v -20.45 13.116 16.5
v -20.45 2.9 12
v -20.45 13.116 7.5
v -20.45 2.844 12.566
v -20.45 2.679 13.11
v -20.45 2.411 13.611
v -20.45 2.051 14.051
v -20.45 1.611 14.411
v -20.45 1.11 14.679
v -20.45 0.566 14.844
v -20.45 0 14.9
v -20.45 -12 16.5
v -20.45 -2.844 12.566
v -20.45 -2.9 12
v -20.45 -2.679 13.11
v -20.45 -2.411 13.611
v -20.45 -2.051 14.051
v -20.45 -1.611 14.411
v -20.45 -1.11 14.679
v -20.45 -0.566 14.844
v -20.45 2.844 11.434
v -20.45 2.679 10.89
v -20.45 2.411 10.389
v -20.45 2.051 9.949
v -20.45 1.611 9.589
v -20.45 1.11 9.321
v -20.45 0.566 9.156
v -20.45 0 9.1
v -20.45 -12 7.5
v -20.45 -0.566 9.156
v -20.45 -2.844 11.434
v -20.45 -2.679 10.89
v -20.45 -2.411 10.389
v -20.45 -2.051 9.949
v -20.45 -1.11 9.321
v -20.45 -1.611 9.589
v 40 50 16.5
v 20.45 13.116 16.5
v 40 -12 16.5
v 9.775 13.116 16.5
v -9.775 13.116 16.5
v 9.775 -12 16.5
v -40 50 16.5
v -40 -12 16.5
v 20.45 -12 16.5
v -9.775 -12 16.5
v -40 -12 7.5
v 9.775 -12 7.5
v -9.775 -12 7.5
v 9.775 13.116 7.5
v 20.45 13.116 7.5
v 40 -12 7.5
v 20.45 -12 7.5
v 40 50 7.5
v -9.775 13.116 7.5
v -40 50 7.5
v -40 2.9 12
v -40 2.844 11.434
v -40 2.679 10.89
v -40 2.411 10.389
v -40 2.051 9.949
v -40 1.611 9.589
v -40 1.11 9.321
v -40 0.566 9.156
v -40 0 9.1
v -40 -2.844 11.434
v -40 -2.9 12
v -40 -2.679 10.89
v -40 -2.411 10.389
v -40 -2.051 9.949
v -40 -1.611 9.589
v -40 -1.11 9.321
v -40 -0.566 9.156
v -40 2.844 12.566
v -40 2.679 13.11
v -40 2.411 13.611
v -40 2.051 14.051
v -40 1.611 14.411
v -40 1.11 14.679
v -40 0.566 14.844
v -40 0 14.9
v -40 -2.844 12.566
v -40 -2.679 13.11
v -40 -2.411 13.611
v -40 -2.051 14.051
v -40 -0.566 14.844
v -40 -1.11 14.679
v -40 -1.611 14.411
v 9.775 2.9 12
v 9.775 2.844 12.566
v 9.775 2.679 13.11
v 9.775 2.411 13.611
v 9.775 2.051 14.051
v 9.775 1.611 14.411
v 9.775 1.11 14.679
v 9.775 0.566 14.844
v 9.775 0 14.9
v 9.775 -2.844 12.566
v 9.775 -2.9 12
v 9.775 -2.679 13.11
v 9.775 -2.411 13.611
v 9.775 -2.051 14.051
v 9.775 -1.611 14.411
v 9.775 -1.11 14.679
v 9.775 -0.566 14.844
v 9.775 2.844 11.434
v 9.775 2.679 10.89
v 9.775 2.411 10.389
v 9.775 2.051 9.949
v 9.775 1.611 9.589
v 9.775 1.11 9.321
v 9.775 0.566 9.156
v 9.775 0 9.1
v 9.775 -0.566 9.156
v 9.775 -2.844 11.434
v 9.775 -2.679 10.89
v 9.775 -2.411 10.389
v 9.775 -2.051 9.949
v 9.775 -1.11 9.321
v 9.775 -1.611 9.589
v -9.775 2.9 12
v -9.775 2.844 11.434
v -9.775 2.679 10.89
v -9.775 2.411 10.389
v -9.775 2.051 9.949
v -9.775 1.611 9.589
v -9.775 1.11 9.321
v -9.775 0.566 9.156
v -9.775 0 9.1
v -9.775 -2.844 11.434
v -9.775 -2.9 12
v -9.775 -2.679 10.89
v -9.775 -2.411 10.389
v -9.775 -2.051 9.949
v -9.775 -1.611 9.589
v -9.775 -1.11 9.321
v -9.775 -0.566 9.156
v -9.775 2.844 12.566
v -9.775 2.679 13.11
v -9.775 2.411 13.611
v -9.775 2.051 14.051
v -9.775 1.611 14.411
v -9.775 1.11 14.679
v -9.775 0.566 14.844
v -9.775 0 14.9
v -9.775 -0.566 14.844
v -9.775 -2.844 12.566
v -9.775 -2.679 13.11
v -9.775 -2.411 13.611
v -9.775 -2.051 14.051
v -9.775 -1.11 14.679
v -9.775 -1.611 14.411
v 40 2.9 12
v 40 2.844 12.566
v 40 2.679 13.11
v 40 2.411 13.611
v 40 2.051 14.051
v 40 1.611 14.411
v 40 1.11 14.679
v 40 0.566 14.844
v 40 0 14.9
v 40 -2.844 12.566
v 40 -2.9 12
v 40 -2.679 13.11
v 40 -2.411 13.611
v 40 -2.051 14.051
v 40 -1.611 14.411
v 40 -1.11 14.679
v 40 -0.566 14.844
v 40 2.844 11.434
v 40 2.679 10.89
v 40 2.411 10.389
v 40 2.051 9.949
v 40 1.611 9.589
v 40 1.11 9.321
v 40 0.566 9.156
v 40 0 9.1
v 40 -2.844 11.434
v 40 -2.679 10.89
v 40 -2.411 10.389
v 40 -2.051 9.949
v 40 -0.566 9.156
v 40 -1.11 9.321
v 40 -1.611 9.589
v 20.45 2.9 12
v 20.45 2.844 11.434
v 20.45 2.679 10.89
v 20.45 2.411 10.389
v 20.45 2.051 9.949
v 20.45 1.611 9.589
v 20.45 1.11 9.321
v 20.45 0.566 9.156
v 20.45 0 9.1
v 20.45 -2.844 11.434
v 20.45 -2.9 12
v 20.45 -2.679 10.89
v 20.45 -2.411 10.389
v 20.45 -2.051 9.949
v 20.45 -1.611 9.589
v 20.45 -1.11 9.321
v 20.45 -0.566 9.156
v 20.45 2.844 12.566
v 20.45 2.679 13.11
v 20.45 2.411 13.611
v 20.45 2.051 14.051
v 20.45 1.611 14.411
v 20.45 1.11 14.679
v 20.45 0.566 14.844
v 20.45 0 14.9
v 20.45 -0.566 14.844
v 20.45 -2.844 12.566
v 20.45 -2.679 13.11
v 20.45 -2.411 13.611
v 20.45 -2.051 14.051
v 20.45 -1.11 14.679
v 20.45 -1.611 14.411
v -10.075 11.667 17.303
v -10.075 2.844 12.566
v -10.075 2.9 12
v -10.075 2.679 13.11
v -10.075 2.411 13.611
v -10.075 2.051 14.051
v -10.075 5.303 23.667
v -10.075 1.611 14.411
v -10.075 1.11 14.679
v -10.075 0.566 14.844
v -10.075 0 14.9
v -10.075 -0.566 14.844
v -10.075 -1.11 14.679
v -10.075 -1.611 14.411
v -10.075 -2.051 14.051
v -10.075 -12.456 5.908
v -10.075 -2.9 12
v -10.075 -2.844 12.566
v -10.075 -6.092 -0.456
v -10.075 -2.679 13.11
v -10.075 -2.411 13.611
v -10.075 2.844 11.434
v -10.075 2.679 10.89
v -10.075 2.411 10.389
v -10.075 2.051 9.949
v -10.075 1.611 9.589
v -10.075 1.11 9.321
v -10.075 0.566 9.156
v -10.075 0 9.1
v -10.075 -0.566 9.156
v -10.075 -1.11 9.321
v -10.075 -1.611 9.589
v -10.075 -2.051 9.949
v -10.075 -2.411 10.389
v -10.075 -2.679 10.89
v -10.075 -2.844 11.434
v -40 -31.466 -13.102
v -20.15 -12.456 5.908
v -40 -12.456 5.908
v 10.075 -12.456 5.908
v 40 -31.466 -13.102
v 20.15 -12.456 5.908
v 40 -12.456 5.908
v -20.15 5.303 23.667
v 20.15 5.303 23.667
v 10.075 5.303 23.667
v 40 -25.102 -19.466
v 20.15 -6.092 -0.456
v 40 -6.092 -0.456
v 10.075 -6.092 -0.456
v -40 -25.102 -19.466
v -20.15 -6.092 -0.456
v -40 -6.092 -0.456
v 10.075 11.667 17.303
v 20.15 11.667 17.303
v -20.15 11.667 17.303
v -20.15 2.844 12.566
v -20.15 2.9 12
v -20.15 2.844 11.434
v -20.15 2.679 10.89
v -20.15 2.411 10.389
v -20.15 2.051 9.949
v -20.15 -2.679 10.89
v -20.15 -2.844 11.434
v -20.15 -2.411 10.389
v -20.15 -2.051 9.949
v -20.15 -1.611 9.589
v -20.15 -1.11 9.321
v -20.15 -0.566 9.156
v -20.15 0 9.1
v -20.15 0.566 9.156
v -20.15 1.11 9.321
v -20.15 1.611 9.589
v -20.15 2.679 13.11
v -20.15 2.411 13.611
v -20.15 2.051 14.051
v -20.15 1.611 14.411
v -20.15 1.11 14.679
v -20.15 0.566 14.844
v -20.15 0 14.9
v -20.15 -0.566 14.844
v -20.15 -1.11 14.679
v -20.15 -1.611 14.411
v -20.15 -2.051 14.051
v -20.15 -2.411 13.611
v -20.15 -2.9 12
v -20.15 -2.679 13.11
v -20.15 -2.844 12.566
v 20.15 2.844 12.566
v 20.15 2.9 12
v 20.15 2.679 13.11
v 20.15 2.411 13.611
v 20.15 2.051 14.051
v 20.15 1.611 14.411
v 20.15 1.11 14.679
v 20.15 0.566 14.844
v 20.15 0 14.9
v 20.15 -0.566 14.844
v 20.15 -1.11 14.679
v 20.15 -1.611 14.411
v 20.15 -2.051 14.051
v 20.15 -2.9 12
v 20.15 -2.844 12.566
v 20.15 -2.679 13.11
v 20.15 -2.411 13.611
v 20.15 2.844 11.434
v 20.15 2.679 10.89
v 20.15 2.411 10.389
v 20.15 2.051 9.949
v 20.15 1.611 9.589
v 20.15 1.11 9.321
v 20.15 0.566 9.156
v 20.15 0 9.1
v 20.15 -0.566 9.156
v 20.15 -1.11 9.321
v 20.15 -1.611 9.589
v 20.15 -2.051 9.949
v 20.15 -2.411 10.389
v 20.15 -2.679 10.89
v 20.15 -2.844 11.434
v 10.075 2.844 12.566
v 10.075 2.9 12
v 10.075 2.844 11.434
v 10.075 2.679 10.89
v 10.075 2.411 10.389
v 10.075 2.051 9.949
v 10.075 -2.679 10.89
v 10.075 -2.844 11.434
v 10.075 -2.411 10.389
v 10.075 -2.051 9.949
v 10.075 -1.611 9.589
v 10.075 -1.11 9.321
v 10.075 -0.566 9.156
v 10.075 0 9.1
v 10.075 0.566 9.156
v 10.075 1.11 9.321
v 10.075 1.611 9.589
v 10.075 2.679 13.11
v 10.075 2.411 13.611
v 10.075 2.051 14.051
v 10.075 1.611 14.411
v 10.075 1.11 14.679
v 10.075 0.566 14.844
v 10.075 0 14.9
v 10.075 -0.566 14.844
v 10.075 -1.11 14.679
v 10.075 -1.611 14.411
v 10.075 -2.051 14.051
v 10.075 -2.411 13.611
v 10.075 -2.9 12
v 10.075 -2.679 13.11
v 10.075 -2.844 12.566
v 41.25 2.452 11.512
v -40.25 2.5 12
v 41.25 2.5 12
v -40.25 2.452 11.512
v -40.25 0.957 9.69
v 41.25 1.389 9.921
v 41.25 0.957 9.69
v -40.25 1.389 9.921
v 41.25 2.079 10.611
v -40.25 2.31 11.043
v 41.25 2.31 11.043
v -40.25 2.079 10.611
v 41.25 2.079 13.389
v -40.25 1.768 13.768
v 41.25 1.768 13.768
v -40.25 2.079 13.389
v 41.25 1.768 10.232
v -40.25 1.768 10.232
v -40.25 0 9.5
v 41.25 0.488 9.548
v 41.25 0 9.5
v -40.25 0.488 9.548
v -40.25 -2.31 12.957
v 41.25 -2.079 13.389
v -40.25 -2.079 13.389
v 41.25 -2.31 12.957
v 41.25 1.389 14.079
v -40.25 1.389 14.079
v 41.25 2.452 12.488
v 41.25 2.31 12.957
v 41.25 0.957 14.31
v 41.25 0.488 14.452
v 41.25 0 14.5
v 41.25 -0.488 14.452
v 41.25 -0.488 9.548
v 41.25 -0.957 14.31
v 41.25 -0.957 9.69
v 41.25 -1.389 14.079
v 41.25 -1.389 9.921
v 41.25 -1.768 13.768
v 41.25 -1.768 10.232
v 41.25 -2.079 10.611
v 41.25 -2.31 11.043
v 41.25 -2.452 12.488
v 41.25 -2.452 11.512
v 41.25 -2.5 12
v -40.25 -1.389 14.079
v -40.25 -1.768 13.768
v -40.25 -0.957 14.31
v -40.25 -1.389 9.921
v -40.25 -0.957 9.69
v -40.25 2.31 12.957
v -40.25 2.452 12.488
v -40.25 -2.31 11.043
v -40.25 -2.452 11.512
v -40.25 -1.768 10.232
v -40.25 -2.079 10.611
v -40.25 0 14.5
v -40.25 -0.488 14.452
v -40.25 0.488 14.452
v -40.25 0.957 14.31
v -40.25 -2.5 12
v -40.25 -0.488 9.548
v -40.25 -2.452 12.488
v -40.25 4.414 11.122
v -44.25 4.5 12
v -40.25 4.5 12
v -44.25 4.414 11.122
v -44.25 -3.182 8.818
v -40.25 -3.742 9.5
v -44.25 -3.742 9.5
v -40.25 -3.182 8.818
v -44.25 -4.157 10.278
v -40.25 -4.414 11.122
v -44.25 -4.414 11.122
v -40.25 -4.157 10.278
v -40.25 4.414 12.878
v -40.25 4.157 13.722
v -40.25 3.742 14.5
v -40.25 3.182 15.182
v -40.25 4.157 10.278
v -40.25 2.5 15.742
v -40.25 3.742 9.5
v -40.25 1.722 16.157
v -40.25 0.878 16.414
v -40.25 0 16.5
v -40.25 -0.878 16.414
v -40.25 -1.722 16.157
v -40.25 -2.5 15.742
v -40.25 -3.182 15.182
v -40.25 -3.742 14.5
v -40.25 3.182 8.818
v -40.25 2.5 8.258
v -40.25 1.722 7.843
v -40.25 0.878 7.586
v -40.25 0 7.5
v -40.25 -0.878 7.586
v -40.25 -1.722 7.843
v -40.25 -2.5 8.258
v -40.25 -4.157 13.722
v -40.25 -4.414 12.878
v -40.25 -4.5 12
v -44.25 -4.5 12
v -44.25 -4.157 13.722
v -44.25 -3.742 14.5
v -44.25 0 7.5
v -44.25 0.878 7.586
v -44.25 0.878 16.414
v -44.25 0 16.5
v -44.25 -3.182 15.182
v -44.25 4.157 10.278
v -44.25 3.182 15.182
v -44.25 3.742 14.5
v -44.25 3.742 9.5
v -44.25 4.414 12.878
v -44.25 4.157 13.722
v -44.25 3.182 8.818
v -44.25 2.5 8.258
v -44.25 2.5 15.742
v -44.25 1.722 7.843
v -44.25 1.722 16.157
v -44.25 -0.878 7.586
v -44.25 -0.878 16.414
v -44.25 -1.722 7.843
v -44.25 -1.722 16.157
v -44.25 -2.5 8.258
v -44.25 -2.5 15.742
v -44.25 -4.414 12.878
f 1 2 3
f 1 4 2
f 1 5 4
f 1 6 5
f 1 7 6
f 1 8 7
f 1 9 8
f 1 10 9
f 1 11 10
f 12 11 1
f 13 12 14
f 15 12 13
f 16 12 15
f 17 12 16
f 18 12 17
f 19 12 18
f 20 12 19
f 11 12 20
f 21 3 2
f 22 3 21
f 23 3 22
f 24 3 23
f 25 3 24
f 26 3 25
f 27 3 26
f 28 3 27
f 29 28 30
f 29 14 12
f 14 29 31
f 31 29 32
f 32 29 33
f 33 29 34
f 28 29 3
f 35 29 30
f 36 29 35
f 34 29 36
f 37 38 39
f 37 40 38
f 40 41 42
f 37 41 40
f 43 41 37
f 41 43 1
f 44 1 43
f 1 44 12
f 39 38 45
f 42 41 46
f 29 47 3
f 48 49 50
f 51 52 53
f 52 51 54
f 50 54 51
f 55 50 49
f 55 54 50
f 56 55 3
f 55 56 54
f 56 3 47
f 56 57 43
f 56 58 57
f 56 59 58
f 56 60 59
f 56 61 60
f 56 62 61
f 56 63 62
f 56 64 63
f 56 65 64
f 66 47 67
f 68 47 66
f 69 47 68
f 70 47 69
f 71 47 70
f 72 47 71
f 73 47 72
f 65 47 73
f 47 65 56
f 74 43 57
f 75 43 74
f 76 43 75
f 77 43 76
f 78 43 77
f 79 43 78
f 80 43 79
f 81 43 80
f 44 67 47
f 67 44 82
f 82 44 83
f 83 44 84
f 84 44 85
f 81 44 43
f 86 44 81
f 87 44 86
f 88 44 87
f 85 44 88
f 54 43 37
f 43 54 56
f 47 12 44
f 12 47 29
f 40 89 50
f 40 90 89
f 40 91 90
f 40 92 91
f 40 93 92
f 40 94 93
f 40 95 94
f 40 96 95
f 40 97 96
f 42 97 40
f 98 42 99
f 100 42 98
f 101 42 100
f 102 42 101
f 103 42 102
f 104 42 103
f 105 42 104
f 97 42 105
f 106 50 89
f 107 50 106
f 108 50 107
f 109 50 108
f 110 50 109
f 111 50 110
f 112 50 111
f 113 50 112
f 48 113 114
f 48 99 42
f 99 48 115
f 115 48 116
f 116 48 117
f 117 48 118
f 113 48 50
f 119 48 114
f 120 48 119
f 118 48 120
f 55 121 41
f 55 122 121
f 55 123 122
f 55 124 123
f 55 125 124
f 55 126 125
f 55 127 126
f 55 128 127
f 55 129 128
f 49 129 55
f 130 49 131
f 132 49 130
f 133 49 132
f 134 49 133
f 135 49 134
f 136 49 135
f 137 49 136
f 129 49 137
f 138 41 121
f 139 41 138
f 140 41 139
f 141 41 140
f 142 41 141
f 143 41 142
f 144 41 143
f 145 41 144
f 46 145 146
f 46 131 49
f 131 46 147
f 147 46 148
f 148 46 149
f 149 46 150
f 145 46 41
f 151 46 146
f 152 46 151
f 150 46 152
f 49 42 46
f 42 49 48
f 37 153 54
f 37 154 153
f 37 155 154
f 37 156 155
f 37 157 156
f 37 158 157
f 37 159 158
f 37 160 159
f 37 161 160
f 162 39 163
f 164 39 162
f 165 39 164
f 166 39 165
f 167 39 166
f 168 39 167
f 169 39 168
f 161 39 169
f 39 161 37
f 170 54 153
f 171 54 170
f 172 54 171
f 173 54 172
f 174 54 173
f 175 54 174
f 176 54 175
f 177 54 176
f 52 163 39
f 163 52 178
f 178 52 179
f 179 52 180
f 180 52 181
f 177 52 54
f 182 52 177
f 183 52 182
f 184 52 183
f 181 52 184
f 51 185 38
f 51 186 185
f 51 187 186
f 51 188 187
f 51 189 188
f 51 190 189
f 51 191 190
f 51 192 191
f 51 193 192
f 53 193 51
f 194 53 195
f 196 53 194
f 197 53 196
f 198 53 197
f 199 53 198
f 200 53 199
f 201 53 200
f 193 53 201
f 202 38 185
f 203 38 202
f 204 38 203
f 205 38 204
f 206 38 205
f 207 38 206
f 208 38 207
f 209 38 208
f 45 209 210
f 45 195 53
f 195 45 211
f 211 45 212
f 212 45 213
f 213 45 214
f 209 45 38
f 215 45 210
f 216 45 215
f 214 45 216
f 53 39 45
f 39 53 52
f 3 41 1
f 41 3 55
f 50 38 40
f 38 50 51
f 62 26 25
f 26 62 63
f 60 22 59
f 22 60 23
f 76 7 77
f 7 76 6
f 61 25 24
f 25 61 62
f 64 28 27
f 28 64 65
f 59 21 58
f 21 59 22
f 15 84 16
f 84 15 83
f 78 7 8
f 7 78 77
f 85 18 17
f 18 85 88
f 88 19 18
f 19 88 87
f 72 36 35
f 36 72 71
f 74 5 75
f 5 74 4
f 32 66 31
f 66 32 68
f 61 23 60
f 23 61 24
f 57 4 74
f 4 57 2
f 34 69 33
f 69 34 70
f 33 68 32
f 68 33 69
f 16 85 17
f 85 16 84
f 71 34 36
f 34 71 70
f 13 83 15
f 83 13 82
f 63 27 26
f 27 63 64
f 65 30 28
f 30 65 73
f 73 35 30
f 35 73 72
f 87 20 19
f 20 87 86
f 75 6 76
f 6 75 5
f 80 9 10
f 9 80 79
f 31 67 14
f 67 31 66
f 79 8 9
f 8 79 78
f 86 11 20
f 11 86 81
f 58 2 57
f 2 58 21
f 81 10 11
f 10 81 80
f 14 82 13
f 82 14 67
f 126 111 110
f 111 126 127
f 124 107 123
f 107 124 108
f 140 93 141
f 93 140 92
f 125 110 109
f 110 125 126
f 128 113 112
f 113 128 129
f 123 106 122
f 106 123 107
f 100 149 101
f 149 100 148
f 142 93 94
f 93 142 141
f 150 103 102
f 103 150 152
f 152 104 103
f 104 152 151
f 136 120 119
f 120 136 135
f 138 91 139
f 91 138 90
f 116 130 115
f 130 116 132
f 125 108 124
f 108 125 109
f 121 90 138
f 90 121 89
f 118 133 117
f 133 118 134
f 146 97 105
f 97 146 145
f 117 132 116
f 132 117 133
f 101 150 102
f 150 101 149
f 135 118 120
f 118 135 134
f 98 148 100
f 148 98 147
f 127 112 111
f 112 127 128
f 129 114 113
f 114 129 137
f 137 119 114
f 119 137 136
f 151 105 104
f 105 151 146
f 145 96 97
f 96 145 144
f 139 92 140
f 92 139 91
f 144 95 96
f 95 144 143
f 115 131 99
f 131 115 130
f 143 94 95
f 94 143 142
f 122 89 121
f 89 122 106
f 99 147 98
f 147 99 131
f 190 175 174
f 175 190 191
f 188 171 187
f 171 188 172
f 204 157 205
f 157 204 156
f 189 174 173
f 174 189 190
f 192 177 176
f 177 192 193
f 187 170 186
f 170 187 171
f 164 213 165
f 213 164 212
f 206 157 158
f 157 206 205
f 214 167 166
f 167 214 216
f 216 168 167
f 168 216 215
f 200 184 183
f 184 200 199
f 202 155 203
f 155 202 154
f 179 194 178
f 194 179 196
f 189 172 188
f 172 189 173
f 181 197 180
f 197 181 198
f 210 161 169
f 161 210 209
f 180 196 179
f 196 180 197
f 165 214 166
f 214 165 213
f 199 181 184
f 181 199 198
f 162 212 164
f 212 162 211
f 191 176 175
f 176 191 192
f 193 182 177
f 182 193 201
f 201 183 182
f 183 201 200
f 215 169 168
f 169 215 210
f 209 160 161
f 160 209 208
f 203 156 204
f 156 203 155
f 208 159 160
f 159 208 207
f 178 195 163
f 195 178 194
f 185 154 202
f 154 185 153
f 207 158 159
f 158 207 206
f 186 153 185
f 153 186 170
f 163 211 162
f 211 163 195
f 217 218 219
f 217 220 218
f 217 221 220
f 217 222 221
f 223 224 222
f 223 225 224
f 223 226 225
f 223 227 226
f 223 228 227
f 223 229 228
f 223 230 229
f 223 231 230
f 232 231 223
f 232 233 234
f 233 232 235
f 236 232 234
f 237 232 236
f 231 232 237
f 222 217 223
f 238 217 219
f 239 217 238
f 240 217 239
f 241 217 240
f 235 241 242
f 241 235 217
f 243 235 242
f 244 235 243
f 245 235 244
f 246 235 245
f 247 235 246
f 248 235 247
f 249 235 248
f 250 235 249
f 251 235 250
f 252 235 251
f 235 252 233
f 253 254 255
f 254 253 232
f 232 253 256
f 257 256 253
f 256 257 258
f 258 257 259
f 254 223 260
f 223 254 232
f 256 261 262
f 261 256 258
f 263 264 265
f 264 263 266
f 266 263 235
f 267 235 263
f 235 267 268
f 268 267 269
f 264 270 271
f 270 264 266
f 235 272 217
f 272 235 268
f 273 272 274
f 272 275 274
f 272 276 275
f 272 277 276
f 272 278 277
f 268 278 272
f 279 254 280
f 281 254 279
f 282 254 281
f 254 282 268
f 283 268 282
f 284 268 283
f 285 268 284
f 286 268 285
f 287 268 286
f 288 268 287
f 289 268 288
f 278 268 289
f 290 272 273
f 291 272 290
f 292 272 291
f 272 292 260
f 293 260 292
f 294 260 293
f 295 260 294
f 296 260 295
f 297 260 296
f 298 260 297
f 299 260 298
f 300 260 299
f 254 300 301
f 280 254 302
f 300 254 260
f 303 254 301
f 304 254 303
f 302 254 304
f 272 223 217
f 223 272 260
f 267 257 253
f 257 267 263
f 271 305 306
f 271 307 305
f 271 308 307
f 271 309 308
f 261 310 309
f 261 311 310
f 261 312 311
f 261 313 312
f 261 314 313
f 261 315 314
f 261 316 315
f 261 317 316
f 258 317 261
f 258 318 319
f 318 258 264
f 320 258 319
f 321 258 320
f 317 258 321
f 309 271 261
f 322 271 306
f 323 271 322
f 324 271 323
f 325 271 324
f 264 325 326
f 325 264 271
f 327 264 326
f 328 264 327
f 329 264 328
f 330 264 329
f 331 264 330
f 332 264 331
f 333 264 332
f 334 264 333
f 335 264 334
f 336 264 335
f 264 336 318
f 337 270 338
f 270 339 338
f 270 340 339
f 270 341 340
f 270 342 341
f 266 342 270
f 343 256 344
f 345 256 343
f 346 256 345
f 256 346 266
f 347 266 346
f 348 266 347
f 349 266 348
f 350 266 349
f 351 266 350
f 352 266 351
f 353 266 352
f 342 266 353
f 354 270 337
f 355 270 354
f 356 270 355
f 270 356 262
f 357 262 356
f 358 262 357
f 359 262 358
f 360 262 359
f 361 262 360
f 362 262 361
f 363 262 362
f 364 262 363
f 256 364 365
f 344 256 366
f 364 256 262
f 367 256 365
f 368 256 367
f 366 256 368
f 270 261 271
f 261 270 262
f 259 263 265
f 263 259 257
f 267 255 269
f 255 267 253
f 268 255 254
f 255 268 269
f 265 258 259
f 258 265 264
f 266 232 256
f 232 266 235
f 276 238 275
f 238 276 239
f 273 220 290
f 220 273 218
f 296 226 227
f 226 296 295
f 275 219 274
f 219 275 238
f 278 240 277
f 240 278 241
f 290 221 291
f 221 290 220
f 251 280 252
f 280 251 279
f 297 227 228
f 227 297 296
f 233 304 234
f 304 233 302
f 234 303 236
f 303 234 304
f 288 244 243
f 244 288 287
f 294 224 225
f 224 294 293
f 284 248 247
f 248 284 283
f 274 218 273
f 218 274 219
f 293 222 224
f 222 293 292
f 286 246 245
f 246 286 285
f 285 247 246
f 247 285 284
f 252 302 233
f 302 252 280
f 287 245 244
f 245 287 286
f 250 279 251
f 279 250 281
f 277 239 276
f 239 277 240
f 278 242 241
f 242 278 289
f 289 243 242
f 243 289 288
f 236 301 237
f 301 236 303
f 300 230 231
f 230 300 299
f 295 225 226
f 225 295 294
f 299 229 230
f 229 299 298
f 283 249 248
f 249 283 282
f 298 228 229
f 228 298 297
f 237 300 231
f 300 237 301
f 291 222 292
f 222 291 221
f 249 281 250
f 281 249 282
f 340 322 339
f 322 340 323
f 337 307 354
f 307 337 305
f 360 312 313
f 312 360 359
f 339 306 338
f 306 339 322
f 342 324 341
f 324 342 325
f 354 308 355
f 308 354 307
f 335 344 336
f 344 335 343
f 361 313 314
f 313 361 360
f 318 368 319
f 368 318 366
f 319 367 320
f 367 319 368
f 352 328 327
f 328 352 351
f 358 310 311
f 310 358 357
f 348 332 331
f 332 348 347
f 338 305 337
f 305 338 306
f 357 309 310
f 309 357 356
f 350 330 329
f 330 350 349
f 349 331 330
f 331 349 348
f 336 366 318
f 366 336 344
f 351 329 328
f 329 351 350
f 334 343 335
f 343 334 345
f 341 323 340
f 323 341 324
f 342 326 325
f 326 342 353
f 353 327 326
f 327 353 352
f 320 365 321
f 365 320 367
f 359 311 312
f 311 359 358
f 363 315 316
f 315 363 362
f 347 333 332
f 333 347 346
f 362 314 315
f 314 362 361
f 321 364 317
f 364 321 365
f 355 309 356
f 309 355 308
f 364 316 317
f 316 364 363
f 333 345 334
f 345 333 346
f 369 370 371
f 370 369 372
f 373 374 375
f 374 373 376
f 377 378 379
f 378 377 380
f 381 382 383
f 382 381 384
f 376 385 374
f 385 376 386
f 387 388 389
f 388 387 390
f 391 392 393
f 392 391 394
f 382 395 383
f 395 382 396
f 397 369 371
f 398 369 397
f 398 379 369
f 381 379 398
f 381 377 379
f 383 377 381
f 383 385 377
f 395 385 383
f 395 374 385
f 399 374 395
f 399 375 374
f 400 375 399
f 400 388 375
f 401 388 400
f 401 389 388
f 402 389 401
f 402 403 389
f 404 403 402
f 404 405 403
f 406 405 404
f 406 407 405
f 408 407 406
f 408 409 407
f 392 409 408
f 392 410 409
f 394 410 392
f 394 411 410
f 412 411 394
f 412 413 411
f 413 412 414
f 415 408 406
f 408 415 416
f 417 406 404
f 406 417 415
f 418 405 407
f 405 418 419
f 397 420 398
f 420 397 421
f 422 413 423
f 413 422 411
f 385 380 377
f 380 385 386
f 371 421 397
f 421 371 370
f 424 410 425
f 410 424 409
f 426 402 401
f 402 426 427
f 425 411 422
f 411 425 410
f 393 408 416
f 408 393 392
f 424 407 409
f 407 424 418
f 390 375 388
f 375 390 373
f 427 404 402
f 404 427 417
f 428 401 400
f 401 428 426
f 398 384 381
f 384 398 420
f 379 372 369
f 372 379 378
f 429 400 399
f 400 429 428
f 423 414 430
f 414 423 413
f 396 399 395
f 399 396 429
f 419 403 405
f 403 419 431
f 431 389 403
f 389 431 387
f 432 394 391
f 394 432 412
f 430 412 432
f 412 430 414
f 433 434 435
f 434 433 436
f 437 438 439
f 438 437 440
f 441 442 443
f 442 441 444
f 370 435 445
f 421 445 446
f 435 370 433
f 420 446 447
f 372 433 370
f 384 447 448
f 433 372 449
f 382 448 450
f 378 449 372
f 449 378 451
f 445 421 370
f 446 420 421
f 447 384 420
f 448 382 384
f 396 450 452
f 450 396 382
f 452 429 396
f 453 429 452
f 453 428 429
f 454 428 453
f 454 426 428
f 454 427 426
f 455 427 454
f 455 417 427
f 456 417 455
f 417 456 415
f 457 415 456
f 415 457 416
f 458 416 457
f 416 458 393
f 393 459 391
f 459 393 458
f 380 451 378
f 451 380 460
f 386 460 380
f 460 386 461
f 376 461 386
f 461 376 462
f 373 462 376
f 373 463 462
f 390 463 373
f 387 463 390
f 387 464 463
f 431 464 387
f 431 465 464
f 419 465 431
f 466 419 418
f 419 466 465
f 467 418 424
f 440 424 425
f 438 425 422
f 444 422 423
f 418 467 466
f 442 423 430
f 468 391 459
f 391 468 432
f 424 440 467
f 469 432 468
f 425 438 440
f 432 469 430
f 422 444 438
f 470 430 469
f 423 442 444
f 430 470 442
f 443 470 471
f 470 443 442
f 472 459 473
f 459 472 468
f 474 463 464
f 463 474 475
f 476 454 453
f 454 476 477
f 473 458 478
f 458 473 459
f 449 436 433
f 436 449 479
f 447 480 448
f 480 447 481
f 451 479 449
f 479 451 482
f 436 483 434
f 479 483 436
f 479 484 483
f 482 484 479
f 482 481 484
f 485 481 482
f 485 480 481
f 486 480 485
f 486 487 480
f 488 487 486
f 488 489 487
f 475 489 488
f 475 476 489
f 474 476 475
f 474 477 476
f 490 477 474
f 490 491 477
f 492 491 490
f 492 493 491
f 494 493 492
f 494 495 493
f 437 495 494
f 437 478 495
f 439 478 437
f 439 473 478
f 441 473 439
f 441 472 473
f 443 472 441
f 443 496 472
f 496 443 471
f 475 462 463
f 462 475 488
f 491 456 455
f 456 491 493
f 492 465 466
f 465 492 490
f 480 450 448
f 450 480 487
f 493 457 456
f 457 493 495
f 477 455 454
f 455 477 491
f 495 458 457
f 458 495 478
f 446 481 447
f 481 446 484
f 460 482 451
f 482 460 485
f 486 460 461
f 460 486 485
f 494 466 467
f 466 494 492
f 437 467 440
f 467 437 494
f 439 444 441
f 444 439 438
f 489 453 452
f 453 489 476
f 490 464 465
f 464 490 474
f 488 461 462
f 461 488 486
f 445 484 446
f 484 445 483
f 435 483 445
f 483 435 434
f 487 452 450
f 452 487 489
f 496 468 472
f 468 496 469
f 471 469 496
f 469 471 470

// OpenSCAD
$fn = 32;

// ------------------------------------------------------------------------
// Butt hinge: hinge 80 mm, leaf swung 45 deg
// Every part is its own module, assembly() places every instance.
// ------------------------------------------------------------------------

// --- part 1 ---
module hinge_base() {
  difference() {
    union() {
      translate([-40, -12, -4.5]) cube([19.55, 62, 9]);
      translate([-9.775, -12, -4.5]) cube([19.55, 62, 9]);
      translate([20.45, -12, -4.5]) cube([19.55, 62, 9]);
      translate([-40, 13.116, -4.5]) cube([80, 36.884, 9]);
    }
    translate([-30.225, 0, 0]) rotate([0, 90, 0]) cylinder(h = 21.55, d = 5.8, center = true);
    translate([0, 0, 0]) rotate([0, 90, 0]) cylinder(h = 21.55, d = 5.8, center = true);
    translate([30.225, 0, 0]) rotate([0, 90, 0]) cylinder(h = 21.55, d = 5.8, center = true);
  }
}

// --- part 2 ---
module hinge_mover() {
  difference() {
    union() {
      translate([-20.15, -40, -4.5]) cube([10.075, 52, 9]);
      translate([10.075, -40, -4.5]) cube([10.075, 52, 9]);
      translate([-40, -40, -4.5]) cube([80, 26.884, 9]);
    }
    translate([-15.113, 0, 0]) rotate([0, 90, 0]) cylinder(h = 12.075, d = 5.8, center = true);
    translate([15.113, 0, 0]) rotate([0, 90, 0]) cylinder(h = 12.075, d = 5.8, center = true);
  }
}

// --- part 3 ---
module hinge_pin() {
  rotate([0, 90, 0]) cylinder(h = 82.5, d = 5, center = true);
  translate([-44.25, 0, 0]) rotate([0, 90, 0]) cylinder(h = 4, d = 9);
}

// --- assembly ---
module assembly() {
  color([0.80, 0.24, 0.20]) translate([0, 0, 12]) rotate([0, 0, 0]) hinge_base();
  color([0.20, 0.45, 0.75]) translate([0, 0, 12]) rotate([45, 0, 0]) hinge_mover();
  color([0.25, 0.62, 0.32]) translate([0, 0, 12]) rotate([0, 0, 0]) hinge_pin();
}

assembly();
